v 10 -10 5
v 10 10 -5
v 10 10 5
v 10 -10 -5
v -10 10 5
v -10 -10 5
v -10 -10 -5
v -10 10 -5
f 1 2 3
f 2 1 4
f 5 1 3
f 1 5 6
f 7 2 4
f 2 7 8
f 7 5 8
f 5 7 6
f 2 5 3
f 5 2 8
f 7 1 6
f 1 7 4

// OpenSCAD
difference(){
cube([20,20,10],center=true); 
translate([0, 0, 3]) %cube([17,17,5],center=true); 
}
